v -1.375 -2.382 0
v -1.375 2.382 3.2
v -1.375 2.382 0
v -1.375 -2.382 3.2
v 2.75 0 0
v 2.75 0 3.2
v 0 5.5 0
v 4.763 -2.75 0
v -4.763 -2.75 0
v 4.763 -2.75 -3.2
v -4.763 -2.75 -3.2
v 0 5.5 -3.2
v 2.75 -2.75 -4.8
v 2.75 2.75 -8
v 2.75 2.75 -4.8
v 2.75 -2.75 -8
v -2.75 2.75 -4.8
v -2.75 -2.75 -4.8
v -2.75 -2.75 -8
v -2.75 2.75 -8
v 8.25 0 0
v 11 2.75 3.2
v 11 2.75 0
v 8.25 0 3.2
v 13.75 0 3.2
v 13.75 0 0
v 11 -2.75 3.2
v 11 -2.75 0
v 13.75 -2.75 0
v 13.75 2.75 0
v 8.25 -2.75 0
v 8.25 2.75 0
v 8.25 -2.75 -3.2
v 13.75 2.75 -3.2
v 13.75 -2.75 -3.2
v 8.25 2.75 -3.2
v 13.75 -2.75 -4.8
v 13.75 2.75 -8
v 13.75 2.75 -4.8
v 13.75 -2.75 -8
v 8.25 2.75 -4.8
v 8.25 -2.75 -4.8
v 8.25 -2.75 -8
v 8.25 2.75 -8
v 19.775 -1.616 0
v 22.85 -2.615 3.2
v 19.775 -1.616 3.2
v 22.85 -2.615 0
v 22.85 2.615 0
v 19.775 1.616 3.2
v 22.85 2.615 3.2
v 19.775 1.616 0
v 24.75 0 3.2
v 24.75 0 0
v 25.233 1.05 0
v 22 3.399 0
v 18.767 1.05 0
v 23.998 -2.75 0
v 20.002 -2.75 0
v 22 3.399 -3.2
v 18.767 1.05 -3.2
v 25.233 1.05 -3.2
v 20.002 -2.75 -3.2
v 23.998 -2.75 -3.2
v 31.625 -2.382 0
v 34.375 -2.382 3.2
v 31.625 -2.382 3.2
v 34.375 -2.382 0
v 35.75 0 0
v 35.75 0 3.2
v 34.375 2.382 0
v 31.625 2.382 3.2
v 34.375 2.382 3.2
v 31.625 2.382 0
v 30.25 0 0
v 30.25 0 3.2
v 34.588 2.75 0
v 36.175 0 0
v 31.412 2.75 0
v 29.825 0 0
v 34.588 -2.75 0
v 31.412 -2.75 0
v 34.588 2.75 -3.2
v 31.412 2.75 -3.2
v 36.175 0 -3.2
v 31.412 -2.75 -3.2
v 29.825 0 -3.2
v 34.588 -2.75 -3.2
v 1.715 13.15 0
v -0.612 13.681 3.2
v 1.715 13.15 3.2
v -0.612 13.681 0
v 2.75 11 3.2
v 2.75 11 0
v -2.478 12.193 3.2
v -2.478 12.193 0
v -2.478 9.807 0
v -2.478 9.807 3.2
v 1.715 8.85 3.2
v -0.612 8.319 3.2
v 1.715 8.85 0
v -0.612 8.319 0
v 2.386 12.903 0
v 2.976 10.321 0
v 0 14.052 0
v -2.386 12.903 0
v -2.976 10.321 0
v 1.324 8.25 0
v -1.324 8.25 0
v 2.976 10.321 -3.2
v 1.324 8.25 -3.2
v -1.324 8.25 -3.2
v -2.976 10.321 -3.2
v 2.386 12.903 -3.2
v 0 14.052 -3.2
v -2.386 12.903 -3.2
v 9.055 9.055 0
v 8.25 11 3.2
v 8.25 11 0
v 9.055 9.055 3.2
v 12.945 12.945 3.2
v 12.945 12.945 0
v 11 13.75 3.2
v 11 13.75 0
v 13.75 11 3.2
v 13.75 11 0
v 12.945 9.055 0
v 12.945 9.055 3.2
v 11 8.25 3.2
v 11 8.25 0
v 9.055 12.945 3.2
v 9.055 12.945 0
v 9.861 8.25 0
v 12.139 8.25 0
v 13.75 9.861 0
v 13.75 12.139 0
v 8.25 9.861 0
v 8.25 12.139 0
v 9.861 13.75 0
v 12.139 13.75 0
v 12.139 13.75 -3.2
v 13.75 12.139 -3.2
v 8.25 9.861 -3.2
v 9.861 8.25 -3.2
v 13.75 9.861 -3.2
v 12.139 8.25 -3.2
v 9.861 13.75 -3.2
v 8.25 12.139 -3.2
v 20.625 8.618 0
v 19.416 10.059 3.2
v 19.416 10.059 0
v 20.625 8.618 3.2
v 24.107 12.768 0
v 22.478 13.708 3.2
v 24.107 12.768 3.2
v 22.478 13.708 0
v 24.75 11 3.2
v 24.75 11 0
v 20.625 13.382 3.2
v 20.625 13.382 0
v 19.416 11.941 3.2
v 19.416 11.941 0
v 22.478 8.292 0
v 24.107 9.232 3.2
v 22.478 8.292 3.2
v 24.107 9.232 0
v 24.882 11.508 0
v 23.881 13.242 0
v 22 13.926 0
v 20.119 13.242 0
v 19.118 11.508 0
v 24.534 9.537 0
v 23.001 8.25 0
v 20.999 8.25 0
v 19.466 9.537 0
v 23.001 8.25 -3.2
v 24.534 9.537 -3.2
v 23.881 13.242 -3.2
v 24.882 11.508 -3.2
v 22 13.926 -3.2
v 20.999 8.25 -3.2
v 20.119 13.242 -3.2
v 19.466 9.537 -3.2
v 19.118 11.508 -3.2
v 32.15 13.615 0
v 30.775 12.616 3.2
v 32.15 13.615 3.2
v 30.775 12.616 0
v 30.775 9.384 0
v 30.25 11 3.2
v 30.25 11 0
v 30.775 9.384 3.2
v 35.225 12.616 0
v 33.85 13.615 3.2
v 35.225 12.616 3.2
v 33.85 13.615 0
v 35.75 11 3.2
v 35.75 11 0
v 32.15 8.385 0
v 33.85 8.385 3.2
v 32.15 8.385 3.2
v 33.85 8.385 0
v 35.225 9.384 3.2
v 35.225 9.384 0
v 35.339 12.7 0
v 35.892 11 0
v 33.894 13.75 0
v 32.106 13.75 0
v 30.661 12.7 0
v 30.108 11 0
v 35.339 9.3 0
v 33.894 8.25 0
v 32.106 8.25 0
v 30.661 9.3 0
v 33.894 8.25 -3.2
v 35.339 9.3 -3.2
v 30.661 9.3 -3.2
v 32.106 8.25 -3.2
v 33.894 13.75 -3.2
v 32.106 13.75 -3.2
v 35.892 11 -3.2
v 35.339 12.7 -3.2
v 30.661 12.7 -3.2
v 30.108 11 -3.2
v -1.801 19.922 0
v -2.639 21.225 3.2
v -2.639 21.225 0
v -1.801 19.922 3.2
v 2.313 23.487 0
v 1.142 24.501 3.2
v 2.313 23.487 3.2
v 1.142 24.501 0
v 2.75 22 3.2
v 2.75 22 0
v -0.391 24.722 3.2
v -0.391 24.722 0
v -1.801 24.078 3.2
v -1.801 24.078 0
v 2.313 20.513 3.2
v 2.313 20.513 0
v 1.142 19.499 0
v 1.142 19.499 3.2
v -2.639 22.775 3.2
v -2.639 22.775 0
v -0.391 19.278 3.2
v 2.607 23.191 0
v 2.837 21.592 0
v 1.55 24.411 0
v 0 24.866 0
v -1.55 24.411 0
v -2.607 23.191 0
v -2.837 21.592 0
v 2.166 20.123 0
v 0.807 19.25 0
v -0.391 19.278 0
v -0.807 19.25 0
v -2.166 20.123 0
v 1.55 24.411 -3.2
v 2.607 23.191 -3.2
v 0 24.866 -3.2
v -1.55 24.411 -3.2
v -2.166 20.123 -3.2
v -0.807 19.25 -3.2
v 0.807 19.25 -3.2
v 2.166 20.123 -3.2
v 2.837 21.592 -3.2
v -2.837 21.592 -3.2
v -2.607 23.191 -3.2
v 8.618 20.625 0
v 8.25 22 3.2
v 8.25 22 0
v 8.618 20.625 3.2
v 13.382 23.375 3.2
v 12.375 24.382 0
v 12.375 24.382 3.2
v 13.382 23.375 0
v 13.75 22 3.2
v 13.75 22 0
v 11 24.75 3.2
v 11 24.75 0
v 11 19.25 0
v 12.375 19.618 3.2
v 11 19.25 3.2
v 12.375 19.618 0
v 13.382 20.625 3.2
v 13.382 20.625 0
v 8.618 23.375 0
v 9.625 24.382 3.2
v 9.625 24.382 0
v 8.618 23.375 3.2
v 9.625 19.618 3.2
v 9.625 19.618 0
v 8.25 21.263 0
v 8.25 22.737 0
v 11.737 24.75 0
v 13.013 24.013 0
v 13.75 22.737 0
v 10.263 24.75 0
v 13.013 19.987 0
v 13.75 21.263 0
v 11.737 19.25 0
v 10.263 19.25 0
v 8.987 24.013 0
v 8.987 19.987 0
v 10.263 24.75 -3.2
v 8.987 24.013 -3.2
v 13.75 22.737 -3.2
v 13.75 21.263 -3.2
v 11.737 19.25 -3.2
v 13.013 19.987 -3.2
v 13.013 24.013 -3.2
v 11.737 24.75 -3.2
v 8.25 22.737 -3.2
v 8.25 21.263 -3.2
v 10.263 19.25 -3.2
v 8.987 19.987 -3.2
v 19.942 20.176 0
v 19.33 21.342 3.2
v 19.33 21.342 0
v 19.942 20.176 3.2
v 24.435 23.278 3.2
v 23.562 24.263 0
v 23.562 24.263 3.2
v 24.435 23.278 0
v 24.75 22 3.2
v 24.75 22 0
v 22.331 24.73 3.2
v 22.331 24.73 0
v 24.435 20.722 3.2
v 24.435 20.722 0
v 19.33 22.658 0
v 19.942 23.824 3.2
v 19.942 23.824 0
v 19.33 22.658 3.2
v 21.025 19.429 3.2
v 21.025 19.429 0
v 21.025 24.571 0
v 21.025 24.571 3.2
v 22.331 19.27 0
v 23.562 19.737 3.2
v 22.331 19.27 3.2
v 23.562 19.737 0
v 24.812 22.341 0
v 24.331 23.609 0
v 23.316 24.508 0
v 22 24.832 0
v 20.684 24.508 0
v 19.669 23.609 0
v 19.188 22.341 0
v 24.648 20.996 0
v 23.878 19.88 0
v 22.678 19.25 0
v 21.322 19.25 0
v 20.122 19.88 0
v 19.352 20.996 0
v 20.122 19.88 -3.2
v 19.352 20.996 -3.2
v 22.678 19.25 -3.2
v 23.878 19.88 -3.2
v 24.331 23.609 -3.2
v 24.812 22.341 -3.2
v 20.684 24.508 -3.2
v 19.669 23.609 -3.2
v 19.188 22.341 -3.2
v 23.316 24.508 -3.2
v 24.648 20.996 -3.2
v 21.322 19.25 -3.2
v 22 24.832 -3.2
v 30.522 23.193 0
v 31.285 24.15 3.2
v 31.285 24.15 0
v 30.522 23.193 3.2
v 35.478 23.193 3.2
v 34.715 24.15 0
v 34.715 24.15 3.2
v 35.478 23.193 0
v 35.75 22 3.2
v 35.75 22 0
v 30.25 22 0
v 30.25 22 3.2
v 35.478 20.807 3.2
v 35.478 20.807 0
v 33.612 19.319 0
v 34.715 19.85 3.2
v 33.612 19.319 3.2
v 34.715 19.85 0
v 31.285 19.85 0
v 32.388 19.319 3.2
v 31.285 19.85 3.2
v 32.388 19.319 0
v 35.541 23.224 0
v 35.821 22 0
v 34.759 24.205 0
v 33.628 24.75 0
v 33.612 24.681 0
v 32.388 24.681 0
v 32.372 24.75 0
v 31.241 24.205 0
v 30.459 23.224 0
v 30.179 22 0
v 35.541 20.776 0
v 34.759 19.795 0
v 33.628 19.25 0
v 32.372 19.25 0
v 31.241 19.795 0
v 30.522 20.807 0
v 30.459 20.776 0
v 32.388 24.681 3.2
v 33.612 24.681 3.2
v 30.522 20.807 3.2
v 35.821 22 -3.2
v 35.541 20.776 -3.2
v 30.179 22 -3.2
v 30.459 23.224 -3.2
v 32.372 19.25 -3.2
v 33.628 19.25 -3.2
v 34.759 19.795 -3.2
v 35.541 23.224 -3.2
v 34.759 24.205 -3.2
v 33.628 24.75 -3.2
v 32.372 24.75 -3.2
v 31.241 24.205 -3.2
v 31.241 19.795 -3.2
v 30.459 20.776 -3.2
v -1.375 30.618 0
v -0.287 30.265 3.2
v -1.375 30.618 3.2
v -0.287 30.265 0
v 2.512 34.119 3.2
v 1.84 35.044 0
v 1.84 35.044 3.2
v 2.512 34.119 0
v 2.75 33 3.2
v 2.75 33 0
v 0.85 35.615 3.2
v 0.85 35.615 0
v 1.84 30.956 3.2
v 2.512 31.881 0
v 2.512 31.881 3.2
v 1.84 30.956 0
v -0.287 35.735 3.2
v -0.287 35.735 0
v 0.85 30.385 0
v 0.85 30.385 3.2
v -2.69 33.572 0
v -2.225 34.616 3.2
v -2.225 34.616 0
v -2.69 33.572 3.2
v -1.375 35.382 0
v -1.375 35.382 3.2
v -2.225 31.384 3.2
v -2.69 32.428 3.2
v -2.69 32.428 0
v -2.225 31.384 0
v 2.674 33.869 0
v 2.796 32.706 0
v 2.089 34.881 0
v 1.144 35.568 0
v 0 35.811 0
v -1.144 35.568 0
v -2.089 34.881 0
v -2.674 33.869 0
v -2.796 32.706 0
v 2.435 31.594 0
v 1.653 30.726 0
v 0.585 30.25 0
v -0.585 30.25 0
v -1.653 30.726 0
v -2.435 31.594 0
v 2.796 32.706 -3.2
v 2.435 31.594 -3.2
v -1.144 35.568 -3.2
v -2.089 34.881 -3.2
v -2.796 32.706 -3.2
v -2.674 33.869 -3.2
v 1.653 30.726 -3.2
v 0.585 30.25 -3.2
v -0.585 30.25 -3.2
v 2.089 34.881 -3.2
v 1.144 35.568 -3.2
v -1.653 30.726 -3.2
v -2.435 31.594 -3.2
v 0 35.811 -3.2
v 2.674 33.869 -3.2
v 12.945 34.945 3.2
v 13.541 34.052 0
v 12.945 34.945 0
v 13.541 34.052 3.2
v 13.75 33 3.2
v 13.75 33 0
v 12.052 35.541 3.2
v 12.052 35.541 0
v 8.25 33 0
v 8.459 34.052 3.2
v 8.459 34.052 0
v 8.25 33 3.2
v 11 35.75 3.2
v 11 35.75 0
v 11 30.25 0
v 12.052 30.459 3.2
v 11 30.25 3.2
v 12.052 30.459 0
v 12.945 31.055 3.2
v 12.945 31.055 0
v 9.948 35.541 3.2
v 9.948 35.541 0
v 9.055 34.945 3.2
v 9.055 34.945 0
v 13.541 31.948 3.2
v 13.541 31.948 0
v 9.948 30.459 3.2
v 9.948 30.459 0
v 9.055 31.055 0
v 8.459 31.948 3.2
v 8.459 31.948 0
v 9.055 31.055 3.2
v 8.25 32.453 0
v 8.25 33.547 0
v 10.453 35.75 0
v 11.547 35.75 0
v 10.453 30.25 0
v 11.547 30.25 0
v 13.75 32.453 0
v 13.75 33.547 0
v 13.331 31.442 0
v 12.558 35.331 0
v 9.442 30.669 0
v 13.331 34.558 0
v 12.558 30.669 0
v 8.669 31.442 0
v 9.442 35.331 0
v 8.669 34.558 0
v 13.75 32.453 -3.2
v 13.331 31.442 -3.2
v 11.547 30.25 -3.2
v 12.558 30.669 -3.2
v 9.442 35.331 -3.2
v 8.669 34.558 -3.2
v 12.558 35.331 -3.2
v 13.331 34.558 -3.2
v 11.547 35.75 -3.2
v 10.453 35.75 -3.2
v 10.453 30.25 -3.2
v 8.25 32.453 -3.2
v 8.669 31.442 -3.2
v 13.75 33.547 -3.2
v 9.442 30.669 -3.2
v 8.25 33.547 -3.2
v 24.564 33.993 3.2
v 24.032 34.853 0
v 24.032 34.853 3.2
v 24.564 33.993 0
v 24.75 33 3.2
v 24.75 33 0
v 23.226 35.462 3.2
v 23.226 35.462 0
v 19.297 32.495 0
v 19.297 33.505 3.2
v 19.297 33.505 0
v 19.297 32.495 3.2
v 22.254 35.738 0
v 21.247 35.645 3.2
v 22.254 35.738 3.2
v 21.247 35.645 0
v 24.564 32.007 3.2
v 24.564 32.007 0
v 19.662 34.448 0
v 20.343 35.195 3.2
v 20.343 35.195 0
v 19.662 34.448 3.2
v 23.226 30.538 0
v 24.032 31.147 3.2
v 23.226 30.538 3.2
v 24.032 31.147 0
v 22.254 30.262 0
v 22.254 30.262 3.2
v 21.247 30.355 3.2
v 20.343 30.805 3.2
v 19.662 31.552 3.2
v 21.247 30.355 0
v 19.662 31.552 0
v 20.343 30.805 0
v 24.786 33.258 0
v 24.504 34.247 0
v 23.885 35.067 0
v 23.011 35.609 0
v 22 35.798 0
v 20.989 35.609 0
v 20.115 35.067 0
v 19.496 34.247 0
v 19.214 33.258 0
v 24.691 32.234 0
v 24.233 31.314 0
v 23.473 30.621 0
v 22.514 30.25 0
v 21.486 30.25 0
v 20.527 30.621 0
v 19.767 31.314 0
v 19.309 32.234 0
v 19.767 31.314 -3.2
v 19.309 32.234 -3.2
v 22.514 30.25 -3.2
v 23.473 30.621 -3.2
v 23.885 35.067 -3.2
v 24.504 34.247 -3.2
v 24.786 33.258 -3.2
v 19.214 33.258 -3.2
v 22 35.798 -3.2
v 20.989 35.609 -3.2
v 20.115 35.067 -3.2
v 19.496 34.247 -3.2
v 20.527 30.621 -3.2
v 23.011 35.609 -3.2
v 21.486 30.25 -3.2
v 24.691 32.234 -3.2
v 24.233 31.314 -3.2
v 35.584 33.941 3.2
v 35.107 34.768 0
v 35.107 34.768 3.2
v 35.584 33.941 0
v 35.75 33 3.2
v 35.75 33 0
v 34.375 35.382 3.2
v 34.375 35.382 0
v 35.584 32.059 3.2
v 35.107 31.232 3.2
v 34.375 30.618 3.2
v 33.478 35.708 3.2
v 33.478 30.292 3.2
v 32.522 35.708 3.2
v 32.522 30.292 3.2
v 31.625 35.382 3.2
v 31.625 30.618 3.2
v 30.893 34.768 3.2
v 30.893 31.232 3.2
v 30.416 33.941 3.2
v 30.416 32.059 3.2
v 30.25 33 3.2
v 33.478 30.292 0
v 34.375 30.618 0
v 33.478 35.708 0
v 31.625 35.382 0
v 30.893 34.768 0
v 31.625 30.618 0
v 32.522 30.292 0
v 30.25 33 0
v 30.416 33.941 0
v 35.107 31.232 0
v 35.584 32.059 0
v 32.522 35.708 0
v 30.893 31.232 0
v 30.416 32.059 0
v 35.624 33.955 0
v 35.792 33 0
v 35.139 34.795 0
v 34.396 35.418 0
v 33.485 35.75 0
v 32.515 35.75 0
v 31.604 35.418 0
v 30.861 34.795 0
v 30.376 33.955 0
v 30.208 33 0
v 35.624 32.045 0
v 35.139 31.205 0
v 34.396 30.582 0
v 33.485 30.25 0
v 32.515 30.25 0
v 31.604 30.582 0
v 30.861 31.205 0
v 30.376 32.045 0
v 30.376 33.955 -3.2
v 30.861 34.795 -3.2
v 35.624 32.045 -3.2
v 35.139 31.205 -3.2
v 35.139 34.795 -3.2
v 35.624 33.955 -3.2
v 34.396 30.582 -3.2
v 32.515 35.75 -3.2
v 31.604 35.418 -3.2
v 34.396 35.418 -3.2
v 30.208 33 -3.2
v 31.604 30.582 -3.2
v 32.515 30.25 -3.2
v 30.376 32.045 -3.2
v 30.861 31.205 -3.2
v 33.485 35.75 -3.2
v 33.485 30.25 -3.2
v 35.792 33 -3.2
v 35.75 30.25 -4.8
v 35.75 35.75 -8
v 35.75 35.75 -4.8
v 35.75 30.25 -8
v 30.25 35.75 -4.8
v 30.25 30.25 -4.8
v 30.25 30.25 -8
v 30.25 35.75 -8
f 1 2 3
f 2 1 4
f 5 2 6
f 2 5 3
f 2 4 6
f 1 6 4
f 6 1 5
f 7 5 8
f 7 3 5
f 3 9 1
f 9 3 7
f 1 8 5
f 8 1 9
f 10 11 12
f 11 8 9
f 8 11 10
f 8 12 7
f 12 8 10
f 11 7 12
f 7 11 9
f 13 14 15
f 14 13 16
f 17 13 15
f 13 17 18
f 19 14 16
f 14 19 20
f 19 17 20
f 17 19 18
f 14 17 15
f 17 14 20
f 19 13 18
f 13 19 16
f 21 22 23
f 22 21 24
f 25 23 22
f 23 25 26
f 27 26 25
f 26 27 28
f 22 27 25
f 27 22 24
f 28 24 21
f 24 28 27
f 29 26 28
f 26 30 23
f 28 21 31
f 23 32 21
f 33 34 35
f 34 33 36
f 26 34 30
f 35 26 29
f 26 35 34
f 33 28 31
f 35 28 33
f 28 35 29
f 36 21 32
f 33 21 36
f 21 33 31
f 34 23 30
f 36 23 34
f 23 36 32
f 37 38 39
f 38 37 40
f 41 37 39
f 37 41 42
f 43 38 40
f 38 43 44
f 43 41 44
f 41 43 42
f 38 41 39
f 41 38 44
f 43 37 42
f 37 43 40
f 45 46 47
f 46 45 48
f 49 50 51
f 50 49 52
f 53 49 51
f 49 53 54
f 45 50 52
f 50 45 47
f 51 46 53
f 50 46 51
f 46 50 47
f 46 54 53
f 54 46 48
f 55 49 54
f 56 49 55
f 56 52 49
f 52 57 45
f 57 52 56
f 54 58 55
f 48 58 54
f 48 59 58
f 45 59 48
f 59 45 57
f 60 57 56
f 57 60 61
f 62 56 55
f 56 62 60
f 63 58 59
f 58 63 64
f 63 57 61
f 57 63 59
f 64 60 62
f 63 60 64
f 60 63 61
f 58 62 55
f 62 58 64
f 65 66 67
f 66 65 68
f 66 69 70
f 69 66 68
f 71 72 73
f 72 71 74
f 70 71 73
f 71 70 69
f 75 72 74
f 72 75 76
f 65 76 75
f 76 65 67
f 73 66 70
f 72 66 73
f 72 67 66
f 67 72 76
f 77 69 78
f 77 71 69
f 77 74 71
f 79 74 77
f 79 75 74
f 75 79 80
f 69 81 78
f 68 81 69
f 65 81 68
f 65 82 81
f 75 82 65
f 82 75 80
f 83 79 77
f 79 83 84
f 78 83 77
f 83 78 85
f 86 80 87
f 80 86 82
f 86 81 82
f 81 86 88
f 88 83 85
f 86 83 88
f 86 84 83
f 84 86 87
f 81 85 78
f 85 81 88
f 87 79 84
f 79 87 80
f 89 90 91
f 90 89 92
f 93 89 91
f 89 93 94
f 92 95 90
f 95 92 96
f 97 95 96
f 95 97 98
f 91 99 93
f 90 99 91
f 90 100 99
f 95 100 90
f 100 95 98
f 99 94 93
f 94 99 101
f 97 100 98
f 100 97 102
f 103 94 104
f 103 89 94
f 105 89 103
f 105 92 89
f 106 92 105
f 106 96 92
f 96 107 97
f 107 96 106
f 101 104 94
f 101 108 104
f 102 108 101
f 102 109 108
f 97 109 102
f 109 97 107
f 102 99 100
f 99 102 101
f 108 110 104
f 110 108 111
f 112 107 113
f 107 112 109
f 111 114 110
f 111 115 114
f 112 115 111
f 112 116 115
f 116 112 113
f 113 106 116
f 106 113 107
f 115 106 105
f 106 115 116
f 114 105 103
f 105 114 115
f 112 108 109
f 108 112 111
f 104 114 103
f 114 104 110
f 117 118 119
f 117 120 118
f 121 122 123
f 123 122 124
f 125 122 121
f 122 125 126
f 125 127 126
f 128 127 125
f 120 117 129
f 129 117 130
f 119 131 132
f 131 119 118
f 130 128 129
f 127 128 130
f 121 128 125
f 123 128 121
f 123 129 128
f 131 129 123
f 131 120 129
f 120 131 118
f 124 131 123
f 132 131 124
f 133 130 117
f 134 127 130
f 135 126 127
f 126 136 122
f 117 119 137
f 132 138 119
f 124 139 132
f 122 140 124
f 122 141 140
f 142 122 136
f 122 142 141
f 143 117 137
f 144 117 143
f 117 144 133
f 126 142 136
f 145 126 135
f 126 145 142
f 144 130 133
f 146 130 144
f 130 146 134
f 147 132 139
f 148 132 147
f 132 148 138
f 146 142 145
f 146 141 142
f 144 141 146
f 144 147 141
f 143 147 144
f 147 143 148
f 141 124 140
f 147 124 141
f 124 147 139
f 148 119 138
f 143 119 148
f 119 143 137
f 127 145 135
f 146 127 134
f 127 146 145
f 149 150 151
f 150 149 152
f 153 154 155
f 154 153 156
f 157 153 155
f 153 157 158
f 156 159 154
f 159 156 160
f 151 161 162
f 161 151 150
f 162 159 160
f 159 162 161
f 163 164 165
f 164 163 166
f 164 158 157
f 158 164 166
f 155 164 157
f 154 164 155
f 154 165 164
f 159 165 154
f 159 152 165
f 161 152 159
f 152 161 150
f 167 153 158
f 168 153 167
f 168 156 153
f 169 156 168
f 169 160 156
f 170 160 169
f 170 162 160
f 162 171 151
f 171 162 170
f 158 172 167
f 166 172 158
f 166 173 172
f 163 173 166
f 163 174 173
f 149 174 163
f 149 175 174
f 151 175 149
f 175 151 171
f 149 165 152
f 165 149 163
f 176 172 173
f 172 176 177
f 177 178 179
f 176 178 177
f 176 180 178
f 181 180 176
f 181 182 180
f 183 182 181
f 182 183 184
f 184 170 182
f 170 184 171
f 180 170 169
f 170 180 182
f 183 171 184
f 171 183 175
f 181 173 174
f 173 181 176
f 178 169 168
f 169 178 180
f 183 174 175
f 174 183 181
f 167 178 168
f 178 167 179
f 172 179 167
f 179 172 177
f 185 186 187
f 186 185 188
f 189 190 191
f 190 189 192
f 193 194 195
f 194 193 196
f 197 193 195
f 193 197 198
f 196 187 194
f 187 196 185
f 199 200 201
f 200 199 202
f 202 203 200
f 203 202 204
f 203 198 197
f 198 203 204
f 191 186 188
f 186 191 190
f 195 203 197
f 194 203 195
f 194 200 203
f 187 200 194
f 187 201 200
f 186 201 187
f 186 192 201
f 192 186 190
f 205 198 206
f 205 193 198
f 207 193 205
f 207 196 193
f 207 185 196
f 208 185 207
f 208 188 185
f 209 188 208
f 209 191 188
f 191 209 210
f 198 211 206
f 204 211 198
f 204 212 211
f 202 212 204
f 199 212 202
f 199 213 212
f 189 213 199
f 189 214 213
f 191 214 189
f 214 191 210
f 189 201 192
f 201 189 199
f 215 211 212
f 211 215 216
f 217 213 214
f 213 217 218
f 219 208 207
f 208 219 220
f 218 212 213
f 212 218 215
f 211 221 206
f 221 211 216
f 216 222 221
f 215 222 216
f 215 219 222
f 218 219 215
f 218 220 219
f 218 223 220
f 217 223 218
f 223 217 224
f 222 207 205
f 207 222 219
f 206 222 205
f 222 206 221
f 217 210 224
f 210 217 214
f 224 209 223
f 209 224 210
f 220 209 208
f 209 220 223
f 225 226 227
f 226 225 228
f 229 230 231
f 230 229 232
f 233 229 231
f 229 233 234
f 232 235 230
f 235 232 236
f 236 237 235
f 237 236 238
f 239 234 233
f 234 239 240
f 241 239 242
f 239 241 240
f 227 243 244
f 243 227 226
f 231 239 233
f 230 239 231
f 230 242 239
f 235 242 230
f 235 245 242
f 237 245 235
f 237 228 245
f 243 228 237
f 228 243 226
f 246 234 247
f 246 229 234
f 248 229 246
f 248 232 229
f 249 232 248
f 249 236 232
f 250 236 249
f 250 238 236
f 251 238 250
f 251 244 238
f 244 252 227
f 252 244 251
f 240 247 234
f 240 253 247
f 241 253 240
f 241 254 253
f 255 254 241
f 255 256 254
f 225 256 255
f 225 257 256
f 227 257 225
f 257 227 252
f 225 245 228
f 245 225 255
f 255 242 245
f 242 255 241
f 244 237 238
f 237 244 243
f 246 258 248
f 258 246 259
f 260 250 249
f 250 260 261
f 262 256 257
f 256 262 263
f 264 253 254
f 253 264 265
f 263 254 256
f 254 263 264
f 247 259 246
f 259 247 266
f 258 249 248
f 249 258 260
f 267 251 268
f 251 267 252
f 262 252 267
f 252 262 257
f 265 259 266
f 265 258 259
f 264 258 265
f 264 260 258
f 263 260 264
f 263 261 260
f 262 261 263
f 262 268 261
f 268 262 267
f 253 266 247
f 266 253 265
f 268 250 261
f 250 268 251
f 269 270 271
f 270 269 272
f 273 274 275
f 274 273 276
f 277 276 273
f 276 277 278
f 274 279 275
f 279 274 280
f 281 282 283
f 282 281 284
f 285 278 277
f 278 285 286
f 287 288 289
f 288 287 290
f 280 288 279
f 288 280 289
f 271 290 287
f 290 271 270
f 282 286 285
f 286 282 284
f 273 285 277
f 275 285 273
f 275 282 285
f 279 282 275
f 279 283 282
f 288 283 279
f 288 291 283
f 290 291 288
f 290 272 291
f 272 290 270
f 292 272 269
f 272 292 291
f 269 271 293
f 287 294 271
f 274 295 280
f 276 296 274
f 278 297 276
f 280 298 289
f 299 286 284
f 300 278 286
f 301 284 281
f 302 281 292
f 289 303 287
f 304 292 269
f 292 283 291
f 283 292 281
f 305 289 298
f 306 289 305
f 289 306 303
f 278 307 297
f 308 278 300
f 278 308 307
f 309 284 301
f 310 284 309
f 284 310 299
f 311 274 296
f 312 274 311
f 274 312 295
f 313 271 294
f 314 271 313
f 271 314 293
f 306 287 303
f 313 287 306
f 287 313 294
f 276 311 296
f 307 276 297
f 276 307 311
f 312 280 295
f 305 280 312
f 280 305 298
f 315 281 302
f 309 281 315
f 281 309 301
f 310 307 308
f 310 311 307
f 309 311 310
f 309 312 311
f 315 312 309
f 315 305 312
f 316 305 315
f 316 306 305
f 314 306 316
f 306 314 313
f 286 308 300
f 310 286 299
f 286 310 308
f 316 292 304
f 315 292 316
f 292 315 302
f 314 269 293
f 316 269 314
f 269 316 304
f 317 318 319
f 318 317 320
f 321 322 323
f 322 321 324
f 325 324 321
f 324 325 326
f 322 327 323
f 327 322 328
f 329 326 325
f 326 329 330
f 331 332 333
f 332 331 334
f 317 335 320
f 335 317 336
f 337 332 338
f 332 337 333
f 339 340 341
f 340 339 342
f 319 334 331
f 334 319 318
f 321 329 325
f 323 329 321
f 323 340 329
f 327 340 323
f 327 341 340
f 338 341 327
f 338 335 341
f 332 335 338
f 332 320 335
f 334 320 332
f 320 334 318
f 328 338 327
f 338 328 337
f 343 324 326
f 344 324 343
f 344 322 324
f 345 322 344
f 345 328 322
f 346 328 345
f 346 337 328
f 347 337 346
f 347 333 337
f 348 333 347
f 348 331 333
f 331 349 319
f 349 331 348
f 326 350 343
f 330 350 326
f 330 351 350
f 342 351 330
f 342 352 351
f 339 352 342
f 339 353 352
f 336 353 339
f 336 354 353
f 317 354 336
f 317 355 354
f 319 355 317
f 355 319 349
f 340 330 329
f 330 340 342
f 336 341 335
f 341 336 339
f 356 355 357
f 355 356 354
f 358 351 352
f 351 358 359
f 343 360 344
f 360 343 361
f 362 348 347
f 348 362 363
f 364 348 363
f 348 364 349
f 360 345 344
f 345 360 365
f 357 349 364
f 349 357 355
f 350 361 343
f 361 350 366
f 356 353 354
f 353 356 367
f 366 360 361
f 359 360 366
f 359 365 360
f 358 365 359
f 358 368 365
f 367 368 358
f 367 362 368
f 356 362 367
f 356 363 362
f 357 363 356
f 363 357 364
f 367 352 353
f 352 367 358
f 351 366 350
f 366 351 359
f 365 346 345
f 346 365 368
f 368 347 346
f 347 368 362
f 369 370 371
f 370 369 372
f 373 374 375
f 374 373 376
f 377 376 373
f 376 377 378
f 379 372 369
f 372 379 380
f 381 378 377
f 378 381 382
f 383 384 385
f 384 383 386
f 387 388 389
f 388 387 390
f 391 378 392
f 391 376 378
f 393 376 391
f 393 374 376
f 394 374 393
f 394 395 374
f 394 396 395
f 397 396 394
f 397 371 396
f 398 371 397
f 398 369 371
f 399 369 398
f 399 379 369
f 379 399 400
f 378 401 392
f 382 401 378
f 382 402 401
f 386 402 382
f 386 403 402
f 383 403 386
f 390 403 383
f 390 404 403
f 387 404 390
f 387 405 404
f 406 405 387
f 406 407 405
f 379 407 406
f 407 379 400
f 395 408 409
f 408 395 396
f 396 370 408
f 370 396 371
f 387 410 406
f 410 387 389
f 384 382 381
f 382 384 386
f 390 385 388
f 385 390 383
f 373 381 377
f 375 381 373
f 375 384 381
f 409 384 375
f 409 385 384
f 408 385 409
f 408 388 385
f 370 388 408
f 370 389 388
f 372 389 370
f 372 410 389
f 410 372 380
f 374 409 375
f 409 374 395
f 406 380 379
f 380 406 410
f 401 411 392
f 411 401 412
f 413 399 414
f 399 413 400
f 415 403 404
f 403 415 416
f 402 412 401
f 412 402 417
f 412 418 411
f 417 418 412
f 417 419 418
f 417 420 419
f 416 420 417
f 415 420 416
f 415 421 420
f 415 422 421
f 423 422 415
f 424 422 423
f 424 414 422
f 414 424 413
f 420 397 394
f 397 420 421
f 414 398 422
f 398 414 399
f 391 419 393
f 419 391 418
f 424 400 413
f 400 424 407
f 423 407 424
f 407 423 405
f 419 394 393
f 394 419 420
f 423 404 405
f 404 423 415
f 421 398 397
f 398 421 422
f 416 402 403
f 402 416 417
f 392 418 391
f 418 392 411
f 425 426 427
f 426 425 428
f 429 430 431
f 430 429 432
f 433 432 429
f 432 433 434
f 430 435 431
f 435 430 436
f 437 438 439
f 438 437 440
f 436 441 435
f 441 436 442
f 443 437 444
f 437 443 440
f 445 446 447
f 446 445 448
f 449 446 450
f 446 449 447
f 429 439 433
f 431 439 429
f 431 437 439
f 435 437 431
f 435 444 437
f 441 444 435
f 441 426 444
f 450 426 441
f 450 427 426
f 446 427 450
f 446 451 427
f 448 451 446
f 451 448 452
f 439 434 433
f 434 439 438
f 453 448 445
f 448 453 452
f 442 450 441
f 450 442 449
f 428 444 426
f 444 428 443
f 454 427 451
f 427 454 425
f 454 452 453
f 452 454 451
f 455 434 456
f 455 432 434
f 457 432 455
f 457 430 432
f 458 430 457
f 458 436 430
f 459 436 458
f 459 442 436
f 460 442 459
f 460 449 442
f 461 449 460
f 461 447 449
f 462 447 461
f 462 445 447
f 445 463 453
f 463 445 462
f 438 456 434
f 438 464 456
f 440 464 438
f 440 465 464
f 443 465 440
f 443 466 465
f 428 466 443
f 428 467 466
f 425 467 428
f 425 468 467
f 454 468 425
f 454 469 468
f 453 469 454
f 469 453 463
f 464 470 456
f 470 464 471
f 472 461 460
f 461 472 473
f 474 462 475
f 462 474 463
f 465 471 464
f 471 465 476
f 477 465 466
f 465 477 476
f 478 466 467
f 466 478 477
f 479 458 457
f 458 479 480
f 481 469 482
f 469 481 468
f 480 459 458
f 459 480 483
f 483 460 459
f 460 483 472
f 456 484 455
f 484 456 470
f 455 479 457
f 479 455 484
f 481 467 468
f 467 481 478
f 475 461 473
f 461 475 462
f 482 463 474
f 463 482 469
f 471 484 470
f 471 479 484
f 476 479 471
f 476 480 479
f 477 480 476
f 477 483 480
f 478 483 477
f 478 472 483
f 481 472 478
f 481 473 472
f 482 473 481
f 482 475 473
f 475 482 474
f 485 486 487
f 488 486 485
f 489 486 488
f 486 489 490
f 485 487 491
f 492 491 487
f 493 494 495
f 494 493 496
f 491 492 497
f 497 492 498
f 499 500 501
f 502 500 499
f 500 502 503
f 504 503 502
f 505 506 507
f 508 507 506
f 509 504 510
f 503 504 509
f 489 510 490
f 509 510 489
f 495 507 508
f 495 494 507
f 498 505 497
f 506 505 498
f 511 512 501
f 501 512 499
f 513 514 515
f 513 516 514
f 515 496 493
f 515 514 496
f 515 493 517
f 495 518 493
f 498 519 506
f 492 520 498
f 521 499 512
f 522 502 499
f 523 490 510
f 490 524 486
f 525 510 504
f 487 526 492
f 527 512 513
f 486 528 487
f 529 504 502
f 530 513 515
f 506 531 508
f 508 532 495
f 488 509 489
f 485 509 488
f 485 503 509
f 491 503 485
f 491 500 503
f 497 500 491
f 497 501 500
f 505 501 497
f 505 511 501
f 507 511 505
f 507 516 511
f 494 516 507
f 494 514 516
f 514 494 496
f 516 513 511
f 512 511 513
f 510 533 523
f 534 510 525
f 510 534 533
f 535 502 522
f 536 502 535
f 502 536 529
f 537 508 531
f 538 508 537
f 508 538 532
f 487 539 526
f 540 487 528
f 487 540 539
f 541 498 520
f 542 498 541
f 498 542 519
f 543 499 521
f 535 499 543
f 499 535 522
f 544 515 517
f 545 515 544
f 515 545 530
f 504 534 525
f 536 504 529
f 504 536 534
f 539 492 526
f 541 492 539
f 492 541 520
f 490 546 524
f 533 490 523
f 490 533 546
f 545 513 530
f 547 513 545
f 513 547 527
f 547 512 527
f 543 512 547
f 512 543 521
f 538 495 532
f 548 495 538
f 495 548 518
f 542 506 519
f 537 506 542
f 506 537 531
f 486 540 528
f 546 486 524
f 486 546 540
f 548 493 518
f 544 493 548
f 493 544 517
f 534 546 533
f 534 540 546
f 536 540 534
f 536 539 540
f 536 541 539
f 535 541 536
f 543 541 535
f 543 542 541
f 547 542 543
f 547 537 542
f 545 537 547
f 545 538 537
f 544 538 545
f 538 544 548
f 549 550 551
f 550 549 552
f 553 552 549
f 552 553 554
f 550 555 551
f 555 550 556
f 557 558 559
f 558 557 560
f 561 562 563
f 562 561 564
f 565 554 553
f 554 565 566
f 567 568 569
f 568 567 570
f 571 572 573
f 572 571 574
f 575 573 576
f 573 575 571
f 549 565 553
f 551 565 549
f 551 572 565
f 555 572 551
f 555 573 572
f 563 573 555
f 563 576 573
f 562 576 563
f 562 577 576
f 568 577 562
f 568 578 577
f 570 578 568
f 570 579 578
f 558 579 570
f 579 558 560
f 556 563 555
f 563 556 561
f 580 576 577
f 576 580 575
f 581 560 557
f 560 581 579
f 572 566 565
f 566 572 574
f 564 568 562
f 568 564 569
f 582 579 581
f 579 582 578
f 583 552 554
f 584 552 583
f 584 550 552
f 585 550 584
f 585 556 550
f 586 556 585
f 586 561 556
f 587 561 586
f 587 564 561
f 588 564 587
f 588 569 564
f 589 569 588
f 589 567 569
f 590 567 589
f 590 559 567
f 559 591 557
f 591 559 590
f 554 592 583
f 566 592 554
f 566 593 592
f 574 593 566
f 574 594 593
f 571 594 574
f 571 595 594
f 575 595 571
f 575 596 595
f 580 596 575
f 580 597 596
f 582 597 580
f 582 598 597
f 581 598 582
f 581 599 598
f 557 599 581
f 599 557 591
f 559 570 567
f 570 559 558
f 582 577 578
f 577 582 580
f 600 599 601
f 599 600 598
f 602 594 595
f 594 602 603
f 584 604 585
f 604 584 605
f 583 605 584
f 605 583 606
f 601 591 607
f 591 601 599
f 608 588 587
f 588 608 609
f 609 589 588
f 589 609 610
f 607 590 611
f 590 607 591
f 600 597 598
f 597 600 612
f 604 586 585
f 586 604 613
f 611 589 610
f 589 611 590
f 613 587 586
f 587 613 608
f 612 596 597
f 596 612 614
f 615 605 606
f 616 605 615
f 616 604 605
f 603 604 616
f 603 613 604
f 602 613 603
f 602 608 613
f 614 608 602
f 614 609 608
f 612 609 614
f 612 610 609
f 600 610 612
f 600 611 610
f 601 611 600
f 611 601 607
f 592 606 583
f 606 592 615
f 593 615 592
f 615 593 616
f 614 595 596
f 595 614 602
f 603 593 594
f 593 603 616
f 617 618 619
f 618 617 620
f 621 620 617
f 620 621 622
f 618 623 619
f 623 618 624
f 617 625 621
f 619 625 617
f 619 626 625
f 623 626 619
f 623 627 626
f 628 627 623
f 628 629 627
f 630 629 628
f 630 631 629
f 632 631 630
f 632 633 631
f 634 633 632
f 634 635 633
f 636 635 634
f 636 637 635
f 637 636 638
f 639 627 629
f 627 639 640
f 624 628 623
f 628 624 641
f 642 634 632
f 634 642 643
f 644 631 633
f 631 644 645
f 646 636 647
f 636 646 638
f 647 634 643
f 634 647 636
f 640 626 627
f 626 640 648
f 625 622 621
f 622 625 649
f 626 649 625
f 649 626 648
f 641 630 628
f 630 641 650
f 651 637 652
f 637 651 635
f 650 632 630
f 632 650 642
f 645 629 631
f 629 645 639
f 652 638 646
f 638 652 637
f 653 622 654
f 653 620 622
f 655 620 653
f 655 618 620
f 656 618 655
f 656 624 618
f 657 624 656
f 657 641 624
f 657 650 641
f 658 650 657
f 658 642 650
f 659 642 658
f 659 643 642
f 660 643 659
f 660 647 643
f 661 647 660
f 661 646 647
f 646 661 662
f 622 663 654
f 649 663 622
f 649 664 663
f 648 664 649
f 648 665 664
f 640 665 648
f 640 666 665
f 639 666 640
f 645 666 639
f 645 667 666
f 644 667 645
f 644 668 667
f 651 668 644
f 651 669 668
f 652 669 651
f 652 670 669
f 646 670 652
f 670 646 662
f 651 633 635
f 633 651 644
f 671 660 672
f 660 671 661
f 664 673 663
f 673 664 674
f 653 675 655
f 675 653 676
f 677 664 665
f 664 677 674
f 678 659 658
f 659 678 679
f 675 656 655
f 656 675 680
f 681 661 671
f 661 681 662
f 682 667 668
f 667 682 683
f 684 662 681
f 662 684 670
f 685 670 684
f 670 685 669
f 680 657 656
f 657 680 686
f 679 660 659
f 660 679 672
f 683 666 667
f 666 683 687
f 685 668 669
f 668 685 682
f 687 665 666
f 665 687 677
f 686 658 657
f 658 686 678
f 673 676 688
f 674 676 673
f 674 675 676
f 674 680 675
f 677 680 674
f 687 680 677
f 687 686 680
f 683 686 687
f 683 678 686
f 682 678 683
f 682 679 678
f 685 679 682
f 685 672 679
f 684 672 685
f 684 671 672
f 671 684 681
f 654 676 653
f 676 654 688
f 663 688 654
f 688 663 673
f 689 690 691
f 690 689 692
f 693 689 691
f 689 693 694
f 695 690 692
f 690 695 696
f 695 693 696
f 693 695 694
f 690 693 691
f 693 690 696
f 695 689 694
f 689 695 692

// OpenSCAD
h=3.2;
r=5.5/2;
fn=4;

module outer_circle(r=10,fn=6) {
  render() intersection_for(i=[0:fn-1]) {
    rotate(360*i/fn) translate([-2*r,-r])
      square(size=[4*r,3*r],center=false);
  }
}

module test_cylinder_fn(h=5,r=10,fn=6) {
  union() {
    cylinder(h=h,r=r,$fn=fn,center=false);
    translate([0,0,-h]) linear_extrude(height=h)
	outer_circle(r=r,fn=fn);
  }
}

step_start=3;
step_size=1;
step_n=16;
row_n=4;
for(i=[step_start:step_size:(step_n+step_start-1)*step_size]) translate([4*r*((i-step_start)%row_n),4*r*(i-(i-step_start)%row_n-step_start)/row_n,0]) {
  if(i==step_start || i==4 || i==(step_n+step_start-1))
	translate([-r,-r,-2.5*h]) cube(size=[2*r,2*r,h],center=false);
  test_cylinder_fn(h=h,r=r,fn=i);
}
